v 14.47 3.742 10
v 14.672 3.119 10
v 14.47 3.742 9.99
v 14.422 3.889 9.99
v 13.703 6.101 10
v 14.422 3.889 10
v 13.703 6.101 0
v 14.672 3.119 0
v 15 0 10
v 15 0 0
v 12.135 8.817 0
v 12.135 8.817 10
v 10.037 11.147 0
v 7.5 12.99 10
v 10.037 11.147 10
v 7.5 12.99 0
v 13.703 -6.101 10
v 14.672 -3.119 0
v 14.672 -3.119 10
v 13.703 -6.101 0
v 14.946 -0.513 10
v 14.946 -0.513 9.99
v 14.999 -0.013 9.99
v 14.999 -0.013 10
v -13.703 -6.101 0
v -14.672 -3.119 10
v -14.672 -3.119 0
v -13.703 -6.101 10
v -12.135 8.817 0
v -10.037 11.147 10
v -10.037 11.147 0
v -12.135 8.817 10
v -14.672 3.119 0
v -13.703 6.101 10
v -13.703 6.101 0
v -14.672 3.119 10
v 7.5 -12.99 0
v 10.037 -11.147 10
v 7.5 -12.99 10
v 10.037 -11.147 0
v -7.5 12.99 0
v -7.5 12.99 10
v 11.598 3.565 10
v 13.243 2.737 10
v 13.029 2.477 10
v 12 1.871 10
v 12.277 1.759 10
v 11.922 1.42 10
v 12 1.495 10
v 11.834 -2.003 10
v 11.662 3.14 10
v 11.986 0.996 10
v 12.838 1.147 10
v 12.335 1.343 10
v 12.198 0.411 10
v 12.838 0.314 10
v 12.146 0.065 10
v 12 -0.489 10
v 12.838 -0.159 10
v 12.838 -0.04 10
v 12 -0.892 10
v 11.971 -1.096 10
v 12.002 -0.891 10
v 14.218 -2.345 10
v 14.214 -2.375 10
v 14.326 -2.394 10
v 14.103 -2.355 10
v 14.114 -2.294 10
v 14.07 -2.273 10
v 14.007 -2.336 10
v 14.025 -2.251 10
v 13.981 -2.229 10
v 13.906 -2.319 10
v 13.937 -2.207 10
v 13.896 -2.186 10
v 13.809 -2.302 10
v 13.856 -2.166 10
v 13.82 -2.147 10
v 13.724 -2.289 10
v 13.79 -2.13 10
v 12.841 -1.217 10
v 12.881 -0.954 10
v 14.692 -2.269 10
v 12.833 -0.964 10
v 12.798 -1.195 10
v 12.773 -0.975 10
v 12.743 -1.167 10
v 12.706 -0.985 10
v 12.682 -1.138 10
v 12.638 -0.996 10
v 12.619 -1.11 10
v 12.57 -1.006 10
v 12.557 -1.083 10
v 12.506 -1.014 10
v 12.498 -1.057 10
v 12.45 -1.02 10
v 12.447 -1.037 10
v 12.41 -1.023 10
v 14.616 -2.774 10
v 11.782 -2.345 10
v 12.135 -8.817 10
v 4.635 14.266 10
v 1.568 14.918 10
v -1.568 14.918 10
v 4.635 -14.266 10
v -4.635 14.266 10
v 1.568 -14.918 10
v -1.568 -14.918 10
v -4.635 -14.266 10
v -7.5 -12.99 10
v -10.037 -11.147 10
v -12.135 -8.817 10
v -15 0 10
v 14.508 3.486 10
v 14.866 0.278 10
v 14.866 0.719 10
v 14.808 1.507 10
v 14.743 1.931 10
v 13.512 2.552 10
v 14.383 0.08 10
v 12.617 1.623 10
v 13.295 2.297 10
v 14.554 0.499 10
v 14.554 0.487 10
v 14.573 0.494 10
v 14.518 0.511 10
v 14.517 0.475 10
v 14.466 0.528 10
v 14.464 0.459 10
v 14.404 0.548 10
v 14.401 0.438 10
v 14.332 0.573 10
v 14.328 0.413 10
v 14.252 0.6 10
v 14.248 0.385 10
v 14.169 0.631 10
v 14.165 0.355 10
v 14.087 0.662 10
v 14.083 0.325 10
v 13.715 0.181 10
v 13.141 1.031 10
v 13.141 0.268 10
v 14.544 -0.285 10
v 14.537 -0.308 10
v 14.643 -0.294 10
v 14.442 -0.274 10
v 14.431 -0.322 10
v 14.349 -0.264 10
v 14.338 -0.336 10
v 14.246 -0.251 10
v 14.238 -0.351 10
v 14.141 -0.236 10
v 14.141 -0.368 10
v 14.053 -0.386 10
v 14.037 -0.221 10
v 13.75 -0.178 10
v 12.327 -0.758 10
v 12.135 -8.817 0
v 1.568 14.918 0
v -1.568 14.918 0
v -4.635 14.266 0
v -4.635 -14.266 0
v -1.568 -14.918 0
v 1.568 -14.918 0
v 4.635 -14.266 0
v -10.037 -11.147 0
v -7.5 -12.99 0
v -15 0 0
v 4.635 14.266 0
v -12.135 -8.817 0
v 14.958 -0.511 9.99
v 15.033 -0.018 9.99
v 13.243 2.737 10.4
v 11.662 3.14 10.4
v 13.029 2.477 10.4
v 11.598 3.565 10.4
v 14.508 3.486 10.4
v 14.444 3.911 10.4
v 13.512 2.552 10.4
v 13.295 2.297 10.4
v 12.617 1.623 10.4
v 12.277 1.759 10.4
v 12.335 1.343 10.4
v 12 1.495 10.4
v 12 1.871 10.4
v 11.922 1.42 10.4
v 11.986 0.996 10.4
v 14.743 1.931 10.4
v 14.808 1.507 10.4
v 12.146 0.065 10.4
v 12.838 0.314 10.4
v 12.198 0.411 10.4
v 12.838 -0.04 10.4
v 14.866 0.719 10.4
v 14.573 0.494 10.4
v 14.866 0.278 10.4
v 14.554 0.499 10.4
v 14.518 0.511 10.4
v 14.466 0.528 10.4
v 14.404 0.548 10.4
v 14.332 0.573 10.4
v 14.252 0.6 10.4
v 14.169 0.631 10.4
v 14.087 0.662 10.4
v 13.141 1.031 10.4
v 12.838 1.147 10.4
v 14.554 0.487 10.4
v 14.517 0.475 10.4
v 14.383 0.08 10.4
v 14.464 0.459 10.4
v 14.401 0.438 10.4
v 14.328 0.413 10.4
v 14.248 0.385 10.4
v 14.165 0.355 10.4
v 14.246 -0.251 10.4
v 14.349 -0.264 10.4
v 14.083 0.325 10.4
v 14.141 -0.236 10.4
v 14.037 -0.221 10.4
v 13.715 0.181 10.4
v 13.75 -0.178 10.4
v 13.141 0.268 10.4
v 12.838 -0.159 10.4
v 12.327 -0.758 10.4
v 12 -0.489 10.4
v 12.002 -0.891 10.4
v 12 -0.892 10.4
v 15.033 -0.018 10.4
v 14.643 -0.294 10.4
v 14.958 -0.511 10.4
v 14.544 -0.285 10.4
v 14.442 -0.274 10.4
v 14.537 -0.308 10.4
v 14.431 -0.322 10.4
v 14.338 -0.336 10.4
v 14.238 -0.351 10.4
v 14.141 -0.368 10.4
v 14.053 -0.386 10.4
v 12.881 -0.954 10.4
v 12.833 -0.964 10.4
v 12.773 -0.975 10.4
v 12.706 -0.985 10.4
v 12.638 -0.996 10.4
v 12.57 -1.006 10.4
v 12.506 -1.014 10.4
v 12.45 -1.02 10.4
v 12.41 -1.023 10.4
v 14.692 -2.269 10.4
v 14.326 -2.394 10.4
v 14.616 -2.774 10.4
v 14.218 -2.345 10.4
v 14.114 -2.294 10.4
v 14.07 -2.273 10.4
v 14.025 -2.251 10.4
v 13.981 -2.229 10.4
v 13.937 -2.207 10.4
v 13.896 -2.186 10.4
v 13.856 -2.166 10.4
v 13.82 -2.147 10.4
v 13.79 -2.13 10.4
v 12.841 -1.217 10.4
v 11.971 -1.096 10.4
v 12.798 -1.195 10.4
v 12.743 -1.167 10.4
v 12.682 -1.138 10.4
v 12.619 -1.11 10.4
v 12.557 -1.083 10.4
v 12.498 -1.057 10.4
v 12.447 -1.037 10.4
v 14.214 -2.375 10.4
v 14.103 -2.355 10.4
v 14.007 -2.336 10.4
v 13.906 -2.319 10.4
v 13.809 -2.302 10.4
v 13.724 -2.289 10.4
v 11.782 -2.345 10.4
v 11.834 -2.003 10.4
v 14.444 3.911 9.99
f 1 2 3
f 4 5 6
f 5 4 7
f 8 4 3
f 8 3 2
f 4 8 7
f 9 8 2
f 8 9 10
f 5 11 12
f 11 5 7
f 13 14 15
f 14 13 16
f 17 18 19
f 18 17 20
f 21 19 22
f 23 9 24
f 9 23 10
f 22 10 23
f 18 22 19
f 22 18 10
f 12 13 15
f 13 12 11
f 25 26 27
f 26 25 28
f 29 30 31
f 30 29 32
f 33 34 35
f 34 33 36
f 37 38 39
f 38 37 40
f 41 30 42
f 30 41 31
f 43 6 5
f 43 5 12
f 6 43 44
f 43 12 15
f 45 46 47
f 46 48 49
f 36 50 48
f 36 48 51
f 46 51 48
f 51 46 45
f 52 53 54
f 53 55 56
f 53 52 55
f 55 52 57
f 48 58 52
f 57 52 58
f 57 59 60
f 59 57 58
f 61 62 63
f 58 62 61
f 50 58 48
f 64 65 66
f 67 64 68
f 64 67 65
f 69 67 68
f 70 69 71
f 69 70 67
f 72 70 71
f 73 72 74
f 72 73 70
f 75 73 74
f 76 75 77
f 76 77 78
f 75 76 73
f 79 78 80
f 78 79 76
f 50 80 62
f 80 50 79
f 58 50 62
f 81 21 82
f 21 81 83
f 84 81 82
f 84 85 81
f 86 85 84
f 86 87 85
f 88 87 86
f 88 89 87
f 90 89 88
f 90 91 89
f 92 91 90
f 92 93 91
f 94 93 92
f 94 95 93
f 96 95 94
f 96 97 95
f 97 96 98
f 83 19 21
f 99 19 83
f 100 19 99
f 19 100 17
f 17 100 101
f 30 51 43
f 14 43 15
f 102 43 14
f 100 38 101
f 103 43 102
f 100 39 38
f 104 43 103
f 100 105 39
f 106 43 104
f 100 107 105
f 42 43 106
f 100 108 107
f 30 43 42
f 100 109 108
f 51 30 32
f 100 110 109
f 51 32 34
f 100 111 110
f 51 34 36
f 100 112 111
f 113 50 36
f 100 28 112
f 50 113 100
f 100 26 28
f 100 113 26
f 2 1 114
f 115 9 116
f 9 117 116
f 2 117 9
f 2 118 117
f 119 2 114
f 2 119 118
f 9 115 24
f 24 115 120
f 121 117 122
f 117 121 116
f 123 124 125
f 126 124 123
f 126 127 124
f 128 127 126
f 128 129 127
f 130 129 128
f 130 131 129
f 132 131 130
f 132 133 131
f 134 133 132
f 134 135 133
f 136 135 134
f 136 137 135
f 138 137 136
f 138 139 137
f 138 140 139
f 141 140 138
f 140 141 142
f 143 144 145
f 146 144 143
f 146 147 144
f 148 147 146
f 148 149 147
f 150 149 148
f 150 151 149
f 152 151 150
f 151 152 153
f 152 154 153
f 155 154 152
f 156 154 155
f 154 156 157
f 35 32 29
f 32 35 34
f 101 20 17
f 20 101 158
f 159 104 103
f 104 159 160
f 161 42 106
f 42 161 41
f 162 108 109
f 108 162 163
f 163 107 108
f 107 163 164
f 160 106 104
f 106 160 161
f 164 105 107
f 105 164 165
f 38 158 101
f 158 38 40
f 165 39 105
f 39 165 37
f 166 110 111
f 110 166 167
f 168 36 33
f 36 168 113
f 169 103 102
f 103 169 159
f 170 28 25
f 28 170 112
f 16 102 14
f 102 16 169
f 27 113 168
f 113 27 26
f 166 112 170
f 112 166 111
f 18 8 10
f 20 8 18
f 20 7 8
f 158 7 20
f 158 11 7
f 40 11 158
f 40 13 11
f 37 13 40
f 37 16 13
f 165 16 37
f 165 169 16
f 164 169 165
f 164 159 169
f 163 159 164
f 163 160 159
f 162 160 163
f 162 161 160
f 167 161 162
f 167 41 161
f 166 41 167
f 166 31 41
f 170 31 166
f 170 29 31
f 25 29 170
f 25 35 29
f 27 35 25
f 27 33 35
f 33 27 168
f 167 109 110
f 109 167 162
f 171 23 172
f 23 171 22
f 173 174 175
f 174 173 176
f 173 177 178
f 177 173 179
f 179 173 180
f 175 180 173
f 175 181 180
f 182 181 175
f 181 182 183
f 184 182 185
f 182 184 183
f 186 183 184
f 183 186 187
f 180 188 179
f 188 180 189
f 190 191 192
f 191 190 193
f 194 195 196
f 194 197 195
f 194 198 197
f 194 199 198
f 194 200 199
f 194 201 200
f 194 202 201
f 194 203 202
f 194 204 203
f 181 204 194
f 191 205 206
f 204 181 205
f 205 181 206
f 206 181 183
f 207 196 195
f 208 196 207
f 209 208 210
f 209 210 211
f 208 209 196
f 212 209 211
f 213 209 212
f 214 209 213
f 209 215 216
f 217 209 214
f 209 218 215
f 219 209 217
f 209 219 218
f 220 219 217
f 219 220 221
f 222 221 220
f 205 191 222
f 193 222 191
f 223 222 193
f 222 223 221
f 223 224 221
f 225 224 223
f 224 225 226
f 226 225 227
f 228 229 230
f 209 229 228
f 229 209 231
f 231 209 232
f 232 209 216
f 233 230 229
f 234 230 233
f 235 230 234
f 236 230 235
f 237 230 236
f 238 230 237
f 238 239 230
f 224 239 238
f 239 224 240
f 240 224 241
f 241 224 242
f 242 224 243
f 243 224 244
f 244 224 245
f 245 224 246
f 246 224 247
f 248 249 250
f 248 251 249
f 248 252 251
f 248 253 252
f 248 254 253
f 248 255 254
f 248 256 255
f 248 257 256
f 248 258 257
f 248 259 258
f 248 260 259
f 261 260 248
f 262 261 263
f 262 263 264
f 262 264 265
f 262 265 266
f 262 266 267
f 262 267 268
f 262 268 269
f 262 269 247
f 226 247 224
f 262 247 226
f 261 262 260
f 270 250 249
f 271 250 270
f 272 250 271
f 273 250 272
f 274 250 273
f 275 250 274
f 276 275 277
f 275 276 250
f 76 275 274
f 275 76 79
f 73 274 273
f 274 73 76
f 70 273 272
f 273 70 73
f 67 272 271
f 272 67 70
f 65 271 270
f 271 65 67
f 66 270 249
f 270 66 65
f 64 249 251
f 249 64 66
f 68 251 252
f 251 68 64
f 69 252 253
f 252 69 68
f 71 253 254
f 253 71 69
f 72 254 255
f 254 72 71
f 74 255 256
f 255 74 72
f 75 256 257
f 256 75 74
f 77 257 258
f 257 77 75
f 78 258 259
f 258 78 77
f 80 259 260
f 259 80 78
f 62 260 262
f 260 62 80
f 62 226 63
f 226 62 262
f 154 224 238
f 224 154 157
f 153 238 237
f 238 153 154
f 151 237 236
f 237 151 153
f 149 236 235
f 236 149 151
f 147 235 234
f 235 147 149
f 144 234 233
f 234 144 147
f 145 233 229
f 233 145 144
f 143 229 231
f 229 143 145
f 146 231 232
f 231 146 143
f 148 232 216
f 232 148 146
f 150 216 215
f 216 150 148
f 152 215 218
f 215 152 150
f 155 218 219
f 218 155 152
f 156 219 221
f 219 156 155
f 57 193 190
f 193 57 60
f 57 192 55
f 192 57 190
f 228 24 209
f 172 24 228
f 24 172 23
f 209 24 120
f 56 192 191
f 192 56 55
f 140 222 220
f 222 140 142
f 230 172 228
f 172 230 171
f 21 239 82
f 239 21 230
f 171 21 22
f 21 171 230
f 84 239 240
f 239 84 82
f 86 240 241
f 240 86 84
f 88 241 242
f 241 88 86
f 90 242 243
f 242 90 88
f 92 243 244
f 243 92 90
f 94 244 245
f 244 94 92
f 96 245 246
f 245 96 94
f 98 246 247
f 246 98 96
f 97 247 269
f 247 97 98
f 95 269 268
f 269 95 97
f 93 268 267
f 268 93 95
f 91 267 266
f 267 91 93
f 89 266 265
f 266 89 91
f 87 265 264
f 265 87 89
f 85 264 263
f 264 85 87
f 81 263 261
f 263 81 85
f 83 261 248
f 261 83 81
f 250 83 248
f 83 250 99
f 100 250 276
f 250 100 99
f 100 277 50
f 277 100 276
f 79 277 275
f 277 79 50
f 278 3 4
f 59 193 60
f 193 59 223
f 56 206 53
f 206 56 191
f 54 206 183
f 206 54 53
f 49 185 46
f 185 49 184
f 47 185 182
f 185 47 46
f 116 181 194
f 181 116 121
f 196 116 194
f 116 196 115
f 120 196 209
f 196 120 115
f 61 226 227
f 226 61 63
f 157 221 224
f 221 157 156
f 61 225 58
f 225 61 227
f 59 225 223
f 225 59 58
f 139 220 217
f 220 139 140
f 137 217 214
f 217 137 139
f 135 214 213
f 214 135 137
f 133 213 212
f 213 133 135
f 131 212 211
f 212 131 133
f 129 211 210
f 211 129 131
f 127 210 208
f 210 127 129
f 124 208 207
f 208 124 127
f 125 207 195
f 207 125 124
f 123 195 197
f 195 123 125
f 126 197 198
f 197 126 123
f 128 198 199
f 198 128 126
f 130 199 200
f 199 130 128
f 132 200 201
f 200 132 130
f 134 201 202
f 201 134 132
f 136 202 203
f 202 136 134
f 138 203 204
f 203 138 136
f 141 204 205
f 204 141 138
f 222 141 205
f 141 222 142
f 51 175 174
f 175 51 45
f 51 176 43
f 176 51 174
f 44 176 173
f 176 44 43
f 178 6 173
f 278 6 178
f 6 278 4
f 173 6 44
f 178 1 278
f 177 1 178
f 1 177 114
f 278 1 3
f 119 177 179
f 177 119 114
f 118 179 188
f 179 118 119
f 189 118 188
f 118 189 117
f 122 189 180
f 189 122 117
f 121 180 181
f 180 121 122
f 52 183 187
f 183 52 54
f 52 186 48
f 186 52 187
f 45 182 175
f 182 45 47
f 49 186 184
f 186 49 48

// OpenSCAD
// Generated by scadwright. Do not hand-edit —
// edit the Python source and regenerate.

union() {
    cylinder(h=10, r=15, center=false);

    translate([11.8653, -1.79326, 9.99]) {
        multmatrix([[0.149438, 0.988771, 0, 0], [0.988771, -0.149438, 0, 0], [0, 0, 1, 0], [0, 0, 0, 1]]) {
            linear_extrude(height=0.41, center=false) {
                translate([-0.9, 0, 0]) {
                    text("M", size=3);
                }
            }
        }
    }

    translate([12, 0, 9.99]) {
        multmatrix([[0, 1, 0, 0], [1, 0, 0, 0], [0, 0, 1, 0], [0, 0, 0, 1]]) {
            linear_extrude(height=0.41, center=false) {
                translate([-0.9, 0, 0]) {
                    text("A", size=3);
                }
            }
        }
    }

    translate([11.8653, 1.79326, 9.99]) {
        multmatrix([[-0.149438, 0.988771, 0, 0], [0.988771, 0.149438, 0, 0], [0, 0, 1, 0], [0, 0, 0, 1]]) {
            linear_extrude(height=0.41, center=false) {
                translate([-0.9, 0, 0]) {
                    text("X", size=3);
                }
            }
        }
    }
}
